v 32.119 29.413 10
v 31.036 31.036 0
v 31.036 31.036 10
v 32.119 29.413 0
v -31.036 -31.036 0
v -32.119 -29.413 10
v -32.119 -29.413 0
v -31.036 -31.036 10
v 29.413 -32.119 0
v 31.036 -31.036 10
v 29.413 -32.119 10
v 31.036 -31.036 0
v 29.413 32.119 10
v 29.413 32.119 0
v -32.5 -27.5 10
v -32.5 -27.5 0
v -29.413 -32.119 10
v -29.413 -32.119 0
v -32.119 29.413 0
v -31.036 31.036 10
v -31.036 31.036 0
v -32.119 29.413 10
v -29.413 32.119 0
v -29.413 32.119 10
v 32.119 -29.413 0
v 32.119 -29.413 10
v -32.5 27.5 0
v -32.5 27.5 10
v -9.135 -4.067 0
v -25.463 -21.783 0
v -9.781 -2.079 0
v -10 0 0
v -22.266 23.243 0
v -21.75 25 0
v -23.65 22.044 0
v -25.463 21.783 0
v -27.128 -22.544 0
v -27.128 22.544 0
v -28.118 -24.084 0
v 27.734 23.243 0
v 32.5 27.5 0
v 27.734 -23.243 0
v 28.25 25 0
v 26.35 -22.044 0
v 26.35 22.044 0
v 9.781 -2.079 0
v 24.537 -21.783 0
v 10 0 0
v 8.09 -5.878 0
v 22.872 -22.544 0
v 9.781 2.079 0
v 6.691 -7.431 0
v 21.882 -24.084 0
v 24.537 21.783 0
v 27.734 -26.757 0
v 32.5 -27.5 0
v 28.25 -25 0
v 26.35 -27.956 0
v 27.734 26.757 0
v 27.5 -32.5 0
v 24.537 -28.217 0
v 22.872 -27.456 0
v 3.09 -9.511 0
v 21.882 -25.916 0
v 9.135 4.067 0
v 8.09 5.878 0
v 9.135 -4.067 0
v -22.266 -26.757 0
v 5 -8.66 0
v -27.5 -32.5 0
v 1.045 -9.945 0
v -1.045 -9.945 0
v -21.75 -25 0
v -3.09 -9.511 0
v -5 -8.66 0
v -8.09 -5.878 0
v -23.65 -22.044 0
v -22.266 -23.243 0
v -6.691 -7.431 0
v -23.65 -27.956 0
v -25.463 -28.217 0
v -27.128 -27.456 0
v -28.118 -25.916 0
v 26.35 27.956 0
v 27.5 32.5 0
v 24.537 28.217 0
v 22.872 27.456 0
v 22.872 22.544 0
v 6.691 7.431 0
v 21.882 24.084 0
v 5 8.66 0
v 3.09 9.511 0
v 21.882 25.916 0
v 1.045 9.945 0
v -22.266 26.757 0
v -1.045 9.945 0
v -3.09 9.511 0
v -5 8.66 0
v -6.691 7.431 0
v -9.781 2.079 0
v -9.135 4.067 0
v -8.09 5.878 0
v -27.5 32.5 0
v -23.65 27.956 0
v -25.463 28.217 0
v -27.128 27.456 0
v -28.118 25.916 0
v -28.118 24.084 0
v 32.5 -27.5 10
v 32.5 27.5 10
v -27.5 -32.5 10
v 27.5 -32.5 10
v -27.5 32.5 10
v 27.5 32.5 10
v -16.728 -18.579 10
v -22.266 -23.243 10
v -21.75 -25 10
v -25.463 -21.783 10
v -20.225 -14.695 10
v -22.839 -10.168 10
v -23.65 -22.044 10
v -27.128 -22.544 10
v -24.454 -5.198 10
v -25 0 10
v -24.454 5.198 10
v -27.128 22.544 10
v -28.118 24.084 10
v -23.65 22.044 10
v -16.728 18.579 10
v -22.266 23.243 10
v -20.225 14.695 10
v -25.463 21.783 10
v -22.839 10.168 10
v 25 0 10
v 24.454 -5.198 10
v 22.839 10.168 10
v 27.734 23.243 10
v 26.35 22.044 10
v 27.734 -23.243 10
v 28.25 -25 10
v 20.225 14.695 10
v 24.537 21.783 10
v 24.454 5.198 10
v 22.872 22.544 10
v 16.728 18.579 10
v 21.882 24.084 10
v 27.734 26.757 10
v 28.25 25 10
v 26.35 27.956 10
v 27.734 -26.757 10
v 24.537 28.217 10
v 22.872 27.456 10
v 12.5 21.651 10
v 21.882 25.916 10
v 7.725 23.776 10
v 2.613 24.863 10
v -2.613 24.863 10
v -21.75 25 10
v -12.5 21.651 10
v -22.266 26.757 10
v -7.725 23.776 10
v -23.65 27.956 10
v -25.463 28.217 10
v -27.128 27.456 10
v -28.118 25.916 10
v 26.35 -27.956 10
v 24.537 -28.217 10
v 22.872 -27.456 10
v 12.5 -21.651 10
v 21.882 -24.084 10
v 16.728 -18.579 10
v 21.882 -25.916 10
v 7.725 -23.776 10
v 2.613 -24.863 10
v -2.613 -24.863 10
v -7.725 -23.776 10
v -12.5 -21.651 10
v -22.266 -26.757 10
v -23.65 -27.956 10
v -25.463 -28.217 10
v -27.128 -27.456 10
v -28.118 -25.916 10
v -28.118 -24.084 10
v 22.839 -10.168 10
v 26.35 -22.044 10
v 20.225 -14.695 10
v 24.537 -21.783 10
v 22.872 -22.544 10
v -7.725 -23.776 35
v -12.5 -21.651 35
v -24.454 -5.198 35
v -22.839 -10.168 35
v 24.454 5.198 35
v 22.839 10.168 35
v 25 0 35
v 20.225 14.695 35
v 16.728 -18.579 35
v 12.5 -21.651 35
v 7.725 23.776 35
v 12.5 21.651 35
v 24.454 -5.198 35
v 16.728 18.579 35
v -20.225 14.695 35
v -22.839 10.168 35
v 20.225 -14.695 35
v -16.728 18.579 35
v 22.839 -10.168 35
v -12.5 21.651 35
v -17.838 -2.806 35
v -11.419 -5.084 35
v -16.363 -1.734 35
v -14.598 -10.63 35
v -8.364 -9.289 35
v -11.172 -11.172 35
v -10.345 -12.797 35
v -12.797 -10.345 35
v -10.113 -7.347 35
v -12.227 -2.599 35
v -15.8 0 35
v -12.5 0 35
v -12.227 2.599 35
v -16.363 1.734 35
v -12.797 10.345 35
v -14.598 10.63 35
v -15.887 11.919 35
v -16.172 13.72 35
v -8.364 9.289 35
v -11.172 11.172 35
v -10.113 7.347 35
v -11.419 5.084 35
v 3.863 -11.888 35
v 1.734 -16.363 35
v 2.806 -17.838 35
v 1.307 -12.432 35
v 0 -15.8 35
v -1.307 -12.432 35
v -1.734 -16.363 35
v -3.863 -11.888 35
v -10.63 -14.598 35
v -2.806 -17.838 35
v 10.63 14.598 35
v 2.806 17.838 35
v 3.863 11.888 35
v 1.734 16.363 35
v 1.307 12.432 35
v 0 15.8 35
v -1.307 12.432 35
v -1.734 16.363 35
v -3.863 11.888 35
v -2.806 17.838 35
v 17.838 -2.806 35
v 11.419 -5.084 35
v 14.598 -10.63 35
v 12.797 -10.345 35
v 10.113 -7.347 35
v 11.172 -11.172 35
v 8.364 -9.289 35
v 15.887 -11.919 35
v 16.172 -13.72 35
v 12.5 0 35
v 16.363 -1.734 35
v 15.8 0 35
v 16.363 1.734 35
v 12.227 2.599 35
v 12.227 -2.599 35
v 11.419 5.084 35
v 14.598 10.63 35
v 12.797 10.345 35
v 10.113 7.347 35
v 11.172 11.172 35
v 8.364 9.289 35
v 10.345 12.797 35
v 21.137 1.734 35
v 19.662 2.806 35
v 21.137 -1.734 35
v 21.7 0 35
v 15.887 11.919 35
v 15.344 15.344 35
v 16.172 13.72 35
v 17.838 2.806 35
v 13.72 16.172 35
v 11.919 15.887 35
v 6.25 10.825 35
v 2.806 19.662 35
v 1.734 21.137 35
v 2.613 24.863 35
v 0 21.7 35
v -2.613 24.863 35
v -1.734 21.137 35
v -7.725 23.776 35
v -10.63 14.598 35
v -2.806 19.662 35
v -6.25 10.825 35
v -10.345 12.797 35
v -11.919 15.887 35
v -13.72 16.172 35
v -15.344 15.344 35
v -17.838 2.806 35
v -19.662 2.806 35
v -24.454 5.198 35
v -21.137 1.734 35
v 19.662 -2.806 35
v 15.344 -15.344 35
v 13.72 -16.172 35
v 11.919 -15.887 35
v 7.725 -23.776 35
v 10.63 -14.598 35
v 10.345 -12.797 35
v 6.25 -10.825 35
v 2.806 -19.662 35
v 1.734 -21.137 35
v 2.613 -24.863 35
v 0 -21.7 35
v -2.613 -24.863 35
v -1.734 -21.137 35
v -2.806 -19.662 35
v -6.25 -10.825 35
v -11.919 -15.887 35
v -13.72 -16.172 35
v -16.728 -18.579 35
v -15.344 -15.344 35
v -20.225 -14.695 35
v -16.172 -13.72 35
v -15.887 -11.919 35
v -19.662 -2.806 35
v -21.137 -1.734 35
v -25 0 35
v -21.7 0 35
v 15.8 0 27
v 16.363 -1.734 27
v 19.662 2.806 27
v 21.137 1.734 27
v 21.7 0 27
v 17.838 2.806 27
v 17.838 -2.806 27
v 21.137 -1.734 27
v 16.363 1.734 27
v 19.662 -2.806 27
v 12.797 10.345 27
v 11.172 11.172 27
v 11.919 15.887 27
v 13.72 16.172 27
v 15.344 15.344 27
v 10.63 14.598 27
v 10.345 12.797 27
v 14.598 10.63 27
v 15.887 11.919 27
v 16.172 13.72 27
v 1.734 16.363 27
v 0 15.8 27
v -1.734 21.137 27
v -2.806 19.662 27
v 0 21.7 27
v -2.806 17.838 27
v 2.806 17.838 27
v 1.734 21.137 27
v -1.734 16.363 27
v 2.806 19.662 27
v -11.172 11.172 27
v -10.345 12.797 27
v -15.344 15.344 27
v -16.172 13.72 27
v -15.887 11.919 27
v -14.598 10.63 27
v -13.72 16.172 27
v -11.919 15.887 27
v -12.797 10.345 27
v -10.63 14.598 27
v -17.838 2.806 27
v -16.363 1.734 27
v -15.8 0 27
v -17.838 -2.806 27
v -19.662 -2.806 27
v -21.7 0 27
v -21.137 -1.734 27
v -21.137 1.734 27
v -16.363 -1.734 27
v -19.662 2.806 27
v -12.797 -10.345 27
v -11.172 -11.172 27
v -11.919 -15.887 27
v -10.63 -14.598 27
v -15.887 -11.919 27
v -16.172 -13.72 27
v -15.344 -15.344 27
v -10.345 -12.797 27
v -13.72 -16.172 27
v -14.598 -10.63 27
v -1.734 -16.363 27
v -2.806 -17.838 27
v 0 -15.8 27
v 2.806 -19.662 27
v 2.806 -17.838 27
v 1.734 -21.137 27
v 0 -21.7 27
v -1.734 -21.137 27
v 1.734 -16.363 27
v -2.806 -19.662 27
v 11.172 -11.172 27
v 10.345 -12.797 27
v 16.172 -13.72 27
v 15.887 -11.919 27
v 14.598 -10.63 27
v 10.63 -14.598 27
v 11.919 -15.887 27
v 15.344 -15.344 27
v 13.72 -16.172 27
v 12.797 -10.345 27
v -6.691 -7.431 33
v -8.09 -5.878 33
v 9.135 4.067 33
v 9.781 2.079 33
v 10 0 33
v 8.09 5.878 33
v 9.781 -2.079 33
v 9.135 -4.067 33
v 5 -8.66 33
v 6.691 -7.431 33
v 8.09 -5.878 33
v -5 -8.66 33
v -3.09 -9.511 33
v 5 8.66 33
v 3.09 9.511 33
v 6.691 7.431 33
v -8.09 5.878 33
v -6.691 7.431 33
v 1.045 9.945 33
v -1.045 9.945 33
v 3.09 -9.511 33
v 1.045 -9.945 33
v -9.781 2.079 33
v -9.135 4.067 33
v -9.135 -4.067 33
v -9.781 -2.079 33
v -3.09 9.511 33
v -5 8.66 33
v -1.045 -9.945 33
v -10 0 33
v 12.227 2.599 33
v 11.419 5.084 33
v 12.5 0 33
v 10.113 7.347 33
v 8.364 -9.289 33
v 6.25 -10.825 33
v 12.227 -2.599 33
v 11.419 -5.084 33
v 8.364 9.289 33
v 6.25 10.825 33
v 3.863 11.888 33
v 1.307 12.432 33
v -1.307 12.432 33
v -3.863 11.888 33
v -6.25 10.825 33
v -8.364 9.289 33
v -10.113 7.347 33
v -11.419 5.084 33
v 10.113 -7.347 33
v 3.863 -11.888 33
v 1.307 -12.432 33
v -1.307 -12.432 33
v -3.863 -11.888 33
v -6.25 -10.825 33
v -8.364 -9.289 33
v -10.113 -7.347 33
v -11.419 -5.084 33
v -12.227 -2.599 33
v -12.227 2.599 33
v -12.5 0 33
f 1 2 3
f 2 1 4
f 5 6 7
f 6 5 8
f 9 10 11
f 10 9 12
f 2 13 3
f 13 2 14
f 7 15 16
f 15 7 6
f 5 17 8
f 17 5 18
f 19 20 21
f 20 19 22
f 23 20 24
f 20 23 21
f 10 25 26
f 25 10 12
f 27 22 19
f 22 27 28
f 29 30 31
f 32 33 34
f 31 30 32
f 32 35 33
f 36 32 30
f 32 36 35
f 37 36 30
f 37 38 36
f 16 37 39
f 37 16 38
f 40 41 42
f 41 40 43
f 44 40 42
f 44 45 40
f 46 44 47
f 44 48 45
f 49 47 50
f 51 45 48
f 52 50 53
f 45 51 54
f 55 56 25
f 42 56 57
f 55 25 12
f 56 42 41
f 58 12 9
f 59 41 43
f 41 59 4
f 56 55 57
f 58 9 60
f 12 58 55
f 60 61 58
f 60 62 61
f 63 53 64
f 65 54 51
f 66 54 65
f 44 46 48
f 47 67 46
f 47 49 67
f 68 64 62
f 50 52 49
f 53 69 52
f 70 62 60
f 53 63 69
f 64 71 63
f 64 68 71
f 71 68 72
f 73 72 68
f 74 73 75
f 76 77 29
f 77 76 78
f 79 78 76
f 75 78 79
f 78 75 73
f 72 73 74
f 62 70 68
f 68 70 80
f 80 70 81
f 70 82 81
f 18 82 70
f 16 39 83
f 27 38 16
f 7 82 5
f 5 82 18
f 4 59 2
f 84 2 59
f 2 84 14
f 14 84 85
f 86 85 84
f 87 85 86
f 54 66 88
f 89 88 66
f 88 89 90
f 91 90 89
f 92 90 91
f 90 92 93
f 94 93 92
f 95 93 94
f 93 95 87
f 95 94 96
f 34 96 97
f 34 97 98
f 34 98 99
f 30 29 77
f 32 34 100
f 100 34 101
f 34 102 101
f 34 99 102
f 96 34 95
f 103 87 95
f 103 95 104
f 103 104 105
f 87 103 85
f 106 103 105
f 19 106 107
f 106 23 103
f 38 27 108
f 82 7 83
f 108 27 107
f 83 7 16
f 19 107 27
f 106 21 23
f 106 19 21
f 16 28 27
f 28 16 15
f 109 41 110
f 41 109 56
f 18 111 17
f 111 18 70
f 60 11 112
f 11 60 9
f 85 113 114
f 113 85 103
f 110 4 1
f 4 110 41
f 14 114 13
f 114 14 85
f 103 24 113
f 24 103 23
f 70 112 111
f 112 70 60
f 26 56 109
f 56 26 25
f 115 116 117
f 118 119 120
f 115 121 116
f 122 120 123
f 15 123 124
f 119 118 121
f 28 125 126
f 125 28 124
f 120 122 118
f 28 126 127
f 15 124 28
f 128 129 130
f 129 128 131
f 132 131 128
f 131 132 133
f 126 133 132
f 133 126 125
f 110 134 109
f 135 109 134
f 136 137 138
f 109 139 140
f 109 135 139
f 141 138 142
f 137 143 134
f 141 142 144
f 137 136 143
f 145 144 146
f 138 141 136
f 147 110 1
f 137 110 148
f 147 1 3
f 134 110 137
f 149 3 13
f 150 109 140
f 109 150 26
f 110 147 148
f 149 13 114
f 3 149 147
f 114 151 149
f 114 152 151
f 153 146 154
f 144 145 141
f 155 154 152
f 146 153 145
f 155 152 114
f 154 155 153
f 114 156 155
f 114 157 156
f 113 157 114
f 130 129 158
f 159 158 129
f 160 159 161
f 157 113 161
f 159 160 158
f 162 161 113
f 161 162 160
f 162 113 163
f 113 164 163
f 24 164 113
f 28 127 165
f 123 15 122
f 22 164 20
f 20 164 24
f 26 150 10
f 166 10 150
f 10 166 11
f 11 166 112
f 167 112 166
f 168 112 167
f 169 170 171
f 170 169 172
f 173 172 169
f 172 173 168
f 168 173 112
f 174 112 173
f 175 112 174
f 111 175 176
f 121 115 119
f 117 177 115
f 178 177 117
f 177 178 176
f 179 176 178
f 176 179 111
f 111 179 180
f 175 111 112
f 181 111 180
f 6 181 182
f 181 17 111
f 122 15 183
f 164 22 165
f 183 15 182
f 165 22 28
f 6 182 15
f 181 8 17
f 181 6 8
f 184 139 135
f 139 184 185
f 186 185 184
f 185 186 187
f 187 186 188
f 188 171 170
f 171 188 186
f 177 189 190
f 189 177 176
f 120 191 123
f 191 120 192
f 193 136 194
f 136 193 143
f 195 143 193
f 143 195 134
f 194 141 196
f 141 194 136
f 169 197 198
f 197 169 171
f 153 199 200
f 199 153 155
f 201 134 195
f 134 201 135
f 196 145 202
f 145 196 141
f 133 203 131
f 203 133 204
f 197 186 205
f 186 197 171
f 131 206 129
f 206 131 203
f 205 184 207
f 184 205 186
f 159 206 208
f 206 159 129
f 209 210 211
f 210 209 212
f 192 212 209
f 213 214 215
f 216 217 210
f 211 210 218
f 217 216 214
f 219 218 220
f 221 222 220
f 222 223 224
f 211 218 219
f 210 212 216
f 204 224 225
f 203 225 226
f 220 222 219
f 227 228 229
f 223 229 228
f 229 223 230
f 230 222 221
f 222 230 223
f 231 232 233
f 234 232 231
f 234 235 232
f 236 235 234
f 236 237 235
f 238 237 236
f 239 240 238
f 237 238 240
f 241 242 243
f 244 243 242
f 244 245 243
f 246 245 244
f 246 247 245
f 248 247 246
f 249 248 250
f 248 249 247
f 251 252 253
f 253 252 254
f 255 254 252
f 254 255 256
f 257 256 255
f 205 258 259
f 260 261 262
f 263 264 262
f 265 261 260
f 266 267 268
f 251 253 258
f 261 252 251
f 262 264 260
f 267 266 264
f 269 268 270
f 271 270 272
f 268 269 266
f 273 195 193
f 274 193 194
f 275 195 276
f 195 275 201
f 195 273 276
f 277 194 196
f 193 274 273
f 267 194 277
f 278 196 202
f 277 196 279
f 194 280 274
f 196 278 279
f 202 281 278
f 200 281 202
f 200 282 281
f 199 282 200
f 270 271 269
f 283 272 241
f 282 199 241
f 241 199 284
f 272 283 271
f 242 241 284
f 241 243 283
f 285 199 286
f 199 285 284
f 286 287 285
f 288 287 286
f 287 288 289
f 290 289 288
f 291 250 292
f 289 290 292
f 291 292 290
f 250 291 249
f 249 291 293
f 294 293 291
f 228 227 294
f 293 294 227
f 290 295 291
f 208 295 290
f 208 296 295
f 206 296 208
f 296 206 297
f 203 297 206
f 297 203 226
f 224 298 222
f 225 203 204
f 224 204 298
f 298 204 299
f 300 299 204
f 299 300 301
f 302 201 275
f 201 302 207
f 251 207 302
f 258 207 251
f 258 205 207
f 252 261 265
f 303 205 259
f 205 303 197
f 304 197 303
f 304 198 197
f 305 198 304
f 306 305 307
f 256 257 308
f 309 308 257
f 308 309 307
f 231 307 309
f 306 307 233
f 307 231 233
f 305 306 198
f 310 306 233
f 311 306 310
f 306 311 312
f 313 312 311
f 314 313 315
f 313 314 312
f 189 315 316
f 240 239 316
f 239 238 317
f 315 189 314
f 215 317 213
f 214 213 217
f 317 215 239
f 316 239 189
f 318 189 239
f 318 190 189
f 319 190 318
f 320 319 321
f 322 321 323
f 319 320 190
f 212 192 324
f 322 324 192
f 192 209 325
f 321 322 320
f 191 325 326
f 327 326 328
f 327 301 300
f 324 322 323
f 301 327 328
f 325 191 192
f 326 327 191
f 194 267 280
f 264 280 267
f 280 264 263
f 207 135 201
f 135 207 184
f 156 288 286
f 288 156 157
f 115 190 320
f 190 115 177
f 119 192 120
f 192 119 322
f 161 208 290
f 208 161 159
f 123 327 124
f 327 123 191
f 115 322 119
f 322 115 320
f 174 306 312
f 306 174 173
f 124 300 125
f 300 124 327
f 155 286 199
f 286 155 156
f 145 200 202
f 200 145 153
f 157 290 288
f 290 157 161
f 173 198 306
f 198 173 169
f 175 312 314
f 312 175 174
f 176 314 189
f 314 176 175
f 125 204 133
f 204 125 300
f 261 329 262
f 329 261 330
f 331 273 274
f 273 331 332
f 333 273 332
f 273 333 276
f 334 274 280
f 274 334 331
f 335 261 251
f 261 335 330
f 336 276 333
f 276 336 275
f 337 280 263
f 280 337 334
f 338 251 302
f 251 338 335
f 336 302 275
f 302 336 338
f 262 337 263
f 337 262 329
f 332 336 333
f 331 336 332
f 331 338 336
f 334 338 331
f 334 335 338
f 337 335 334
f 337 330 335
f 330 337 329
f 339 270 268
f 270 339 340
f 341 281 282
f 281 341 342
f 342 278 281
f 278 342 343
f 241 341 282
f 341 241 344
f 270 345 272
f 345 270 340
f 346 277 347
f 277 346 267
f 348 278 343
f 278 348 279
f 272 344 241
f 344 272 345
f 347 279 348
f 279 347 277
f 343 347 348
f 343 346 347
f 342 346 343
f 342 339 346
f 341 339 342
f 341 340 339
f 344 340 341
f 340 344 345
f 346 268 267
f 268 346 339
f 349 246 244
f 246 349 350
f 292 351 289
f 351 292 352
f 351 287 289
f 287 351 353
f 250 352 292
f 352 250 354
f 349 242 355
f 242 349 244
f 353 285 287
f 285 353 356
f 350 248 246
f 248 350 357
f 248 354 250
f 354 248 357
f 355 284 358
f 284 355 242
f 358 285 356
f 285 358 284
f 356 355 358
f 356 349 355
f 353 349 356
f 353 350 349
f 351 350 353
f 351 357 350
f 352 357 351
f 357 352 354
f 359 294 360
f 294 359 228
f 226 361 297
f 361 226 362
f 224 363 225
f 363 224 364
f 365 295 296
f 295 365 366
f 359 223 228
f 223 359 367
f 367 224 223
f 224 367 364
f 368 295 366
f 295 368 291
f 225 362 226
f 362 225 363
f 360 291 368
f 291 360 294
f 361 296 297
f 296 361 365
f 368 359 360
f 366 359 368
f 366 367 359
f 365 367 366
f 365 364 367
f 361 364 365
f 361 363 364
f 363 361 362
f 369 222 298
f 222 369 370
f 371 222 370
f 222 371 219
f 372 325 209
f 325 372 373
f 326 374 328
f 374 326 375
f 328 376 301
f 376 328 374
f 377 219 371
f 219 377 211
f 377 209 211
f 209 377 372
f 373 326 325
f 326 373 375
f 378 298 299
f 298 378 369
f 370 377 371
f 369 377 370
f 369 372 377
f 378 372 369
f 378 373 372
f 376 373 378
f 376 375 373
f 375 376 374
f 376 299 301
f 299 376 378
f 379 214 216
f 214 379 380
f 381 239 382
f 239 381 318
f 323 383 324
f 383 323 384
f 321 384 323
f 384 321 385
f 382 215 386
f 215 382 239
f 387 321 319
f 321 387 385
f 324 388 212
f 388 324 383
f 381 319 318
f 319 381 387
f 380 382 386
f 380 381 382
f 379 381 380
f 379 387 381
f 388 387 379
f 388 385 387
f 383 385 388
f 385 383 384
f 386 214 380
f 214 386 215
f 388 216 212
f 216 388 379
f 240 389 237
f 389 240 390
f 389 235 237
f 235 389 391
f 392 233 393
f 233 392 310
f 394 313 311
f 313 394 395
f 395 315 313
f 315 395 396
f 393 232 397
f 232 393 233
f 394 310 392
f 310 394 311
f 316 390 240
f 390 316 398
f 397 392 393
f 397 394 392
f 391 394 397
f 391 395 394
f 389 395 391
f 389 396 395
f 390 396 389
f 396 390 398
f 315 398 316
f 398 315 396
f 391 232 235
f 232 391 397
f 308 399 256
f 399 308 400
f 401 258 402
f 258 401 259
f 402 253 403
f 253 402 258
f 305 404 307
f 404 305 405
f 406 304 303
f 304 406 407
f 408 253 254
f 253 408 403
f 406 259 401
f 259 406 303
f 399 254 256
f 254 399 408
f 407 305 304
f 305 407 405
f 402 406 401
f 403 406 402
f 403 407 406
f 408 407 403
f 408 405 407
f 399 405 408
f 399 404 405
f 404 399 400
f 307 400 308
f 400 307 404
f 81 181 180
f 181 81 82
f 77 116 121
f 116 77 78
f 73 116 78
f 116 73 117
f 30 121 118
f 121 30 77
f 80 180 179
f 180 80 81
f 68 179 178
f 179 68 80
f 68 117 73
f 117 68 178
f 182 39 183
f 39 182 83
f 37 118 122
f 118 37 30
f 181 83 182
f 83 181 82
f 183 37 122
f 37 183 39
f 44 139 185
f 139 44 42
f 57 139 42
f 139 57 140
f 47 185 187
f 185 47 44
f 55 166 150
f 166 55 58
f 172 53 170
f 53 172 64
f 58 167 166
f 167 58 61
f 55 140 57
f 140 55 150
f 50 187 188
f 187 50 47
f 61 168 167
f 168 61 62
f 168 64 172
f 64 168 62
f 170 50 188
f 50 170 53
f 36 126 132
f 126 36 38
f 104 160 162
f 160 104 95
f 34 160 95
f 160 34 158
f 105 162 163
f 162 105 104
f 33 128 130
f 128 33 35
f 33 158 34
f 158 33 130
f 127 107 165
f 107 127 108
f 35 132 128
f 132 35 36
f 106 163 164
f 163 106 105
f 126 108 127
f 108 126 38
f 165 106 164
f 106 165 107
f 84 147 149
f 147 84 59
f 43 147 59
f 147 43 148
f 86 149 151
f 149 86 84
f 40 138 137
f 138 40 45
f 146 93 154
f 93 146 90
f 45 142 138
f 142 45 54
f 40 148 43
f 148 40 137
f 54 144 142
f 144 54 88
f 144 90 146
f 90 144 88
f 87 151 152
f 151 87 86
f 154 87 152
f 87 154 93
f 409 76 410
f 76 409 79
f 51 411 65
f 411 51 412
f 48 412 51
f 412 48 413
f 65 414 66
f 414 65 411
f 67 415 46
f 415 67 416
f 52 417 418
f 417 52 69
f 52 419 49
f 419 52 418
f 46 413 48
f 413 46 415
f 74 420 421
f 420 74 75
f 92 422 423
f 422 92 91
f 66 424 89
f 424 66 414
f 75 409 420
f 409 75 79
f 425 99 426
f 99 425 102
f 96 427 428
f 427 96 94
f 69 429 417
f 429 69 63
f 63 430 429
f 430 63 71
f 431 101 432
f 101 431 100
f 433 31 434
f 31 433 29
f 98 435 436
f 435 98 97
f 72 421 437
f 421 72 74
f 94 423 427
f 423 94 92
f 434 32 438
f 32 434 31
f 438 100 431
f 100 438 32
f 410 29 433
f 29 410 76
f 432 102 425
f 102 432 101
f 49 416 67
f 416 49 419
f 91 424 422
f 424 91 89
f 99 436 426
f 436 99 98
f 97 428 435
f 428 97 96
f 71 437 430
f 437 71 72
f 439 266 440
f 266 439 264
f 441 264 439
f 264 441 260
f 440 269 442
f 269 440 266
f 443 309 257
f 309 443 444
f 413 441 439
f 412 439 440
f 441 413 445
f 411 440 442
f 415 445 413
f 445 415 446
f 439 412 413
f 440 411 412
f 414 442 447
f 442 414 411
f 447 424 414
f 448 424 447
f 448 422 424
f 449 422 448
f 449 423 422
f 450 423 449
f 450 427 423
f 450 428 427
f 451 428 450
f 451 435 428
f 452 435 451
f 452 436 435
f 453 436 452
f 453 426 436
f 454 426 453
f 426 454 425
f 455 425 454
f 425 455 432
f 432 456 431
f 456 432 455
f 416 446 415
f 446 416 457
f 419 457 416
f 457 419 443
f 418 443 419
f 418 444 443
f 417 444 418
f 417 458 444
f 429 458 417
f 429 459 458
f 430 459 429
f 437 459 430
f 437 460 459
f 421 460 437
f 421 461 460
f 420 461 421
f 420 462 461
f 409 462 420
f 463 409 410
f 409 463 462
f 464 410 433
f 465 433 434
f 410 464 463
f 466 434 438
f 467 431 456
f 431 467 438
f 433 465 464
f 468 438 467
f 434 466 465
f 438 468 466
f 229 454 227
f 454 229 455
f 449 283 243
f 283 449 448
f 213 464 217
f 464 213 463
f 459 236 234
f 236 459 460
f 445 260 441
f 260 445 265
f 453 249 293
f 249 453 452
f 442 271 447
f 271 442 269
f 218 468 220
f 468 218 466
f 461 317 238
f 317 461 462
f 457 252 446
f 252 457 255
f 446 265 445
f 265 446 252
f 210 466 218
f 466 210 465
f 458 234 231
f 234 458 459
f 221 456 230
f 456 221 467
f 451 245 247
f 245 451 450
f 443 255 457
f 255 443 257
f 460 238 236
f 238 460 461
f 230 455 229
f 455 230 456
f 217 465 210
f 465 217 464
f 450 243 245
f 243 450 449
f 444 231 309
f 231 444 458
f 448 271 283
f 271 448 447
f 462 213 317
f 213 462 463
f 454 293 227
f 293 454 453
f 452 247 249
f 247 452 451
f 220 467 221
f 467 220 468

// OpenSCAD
// file: helpers.scad
module roundedRect(size, radius)
{
    linear_extrude(height=size.z) hull() {
        // place 4 circles in the corners, with the given radius
        translate([(-size.x/2)+(radius/2), (-size.y/2)+(radius/2), 0])
          circle(r=radius);
        translate([(size.x/2)-(radius/2), (-size.y/2)+(radius/2), 0])
          circle(r=radius);
        translate([(-size.x/2)+(radius/2), (size.y/2)-(radius/2), 0])
          circle(r=radius);
        translate([(size.x/2)-(radius/2), (size.y/2)-(radius/2), 0])
          circle(r=radius);
    }
}

module pcd(n, d) 
{
    angle = 360/n;
    for (i=[0:n-1]) {
        rotate([0,0,i*angle]) translate([d/2,0,0]) children();
    }
}

module grid(size, xn, yn, center=false)
{
    xmin = center == true ?  -0.5 * size[0] : 0;
    ymin = center == true ?  -0.5 * size[1] : 0;
    x_spacing = size[0] / (xn - 1);
    y_spacing = size[1] / (yn - 1);
    for (y = [0: yn - 1]) {
        for (x = [0: xn-1]) {
            translate([xmin+x*x_spacing, ymin + y*y_spacing, 0]) children();
        }
    }
}
// file: project.scad
housing_h = 35;
bearing_h  = 20;
insert_h = 8;
insert_pcd = 37.5;

hole_eps = 0.02;
hole_start_eps = 0.01;

boss_holes = [50, 50];
boss_flange_thk = 10;

module thru_hole() {
    translate([0, 0, -hole_start_eps]) children();
}
// main file
include <project.scad>
use <helpers.scad>

module bearing_housing() {
    boss_size = [60, 60, 10];
    boss_rad = 5;
    cyl_dia = 50;
    cyl_h = 35;
    thru_dia = 20;
    cap_pcd = 37.5;
    cap_n = 8;
    M6_clearance = 6.5;
    M4_insert_h = 8;
    M4_insert_d = 5.9;
    flange_thk = 2;
    flange_dia = 25;
    
    color ("silver") difference() {
        union() {
            roundedRect(boss_size, boss_rad);
            cylinder(h=cyl_h, d=cyl_dia);
        }
        cylinder(h=housing_h,d=thru_dia);
        translate([0,0,housing_h - flange_thk]) cylinder(h=flange_thk+hole_eps, d=flange_dia);
        pcd(cap_n, cap_pcd) translate([0,0,housing_h-M4_insert_h]) cylinder(d=M4_insert_d, h=M4_insert_h+hole_eps);
        grid(boss_holes, 2, 2, center=true) cylinder(d=M6_clearance, h=boss_size.z+hole_eps);
    }
}

bearing_housing();
